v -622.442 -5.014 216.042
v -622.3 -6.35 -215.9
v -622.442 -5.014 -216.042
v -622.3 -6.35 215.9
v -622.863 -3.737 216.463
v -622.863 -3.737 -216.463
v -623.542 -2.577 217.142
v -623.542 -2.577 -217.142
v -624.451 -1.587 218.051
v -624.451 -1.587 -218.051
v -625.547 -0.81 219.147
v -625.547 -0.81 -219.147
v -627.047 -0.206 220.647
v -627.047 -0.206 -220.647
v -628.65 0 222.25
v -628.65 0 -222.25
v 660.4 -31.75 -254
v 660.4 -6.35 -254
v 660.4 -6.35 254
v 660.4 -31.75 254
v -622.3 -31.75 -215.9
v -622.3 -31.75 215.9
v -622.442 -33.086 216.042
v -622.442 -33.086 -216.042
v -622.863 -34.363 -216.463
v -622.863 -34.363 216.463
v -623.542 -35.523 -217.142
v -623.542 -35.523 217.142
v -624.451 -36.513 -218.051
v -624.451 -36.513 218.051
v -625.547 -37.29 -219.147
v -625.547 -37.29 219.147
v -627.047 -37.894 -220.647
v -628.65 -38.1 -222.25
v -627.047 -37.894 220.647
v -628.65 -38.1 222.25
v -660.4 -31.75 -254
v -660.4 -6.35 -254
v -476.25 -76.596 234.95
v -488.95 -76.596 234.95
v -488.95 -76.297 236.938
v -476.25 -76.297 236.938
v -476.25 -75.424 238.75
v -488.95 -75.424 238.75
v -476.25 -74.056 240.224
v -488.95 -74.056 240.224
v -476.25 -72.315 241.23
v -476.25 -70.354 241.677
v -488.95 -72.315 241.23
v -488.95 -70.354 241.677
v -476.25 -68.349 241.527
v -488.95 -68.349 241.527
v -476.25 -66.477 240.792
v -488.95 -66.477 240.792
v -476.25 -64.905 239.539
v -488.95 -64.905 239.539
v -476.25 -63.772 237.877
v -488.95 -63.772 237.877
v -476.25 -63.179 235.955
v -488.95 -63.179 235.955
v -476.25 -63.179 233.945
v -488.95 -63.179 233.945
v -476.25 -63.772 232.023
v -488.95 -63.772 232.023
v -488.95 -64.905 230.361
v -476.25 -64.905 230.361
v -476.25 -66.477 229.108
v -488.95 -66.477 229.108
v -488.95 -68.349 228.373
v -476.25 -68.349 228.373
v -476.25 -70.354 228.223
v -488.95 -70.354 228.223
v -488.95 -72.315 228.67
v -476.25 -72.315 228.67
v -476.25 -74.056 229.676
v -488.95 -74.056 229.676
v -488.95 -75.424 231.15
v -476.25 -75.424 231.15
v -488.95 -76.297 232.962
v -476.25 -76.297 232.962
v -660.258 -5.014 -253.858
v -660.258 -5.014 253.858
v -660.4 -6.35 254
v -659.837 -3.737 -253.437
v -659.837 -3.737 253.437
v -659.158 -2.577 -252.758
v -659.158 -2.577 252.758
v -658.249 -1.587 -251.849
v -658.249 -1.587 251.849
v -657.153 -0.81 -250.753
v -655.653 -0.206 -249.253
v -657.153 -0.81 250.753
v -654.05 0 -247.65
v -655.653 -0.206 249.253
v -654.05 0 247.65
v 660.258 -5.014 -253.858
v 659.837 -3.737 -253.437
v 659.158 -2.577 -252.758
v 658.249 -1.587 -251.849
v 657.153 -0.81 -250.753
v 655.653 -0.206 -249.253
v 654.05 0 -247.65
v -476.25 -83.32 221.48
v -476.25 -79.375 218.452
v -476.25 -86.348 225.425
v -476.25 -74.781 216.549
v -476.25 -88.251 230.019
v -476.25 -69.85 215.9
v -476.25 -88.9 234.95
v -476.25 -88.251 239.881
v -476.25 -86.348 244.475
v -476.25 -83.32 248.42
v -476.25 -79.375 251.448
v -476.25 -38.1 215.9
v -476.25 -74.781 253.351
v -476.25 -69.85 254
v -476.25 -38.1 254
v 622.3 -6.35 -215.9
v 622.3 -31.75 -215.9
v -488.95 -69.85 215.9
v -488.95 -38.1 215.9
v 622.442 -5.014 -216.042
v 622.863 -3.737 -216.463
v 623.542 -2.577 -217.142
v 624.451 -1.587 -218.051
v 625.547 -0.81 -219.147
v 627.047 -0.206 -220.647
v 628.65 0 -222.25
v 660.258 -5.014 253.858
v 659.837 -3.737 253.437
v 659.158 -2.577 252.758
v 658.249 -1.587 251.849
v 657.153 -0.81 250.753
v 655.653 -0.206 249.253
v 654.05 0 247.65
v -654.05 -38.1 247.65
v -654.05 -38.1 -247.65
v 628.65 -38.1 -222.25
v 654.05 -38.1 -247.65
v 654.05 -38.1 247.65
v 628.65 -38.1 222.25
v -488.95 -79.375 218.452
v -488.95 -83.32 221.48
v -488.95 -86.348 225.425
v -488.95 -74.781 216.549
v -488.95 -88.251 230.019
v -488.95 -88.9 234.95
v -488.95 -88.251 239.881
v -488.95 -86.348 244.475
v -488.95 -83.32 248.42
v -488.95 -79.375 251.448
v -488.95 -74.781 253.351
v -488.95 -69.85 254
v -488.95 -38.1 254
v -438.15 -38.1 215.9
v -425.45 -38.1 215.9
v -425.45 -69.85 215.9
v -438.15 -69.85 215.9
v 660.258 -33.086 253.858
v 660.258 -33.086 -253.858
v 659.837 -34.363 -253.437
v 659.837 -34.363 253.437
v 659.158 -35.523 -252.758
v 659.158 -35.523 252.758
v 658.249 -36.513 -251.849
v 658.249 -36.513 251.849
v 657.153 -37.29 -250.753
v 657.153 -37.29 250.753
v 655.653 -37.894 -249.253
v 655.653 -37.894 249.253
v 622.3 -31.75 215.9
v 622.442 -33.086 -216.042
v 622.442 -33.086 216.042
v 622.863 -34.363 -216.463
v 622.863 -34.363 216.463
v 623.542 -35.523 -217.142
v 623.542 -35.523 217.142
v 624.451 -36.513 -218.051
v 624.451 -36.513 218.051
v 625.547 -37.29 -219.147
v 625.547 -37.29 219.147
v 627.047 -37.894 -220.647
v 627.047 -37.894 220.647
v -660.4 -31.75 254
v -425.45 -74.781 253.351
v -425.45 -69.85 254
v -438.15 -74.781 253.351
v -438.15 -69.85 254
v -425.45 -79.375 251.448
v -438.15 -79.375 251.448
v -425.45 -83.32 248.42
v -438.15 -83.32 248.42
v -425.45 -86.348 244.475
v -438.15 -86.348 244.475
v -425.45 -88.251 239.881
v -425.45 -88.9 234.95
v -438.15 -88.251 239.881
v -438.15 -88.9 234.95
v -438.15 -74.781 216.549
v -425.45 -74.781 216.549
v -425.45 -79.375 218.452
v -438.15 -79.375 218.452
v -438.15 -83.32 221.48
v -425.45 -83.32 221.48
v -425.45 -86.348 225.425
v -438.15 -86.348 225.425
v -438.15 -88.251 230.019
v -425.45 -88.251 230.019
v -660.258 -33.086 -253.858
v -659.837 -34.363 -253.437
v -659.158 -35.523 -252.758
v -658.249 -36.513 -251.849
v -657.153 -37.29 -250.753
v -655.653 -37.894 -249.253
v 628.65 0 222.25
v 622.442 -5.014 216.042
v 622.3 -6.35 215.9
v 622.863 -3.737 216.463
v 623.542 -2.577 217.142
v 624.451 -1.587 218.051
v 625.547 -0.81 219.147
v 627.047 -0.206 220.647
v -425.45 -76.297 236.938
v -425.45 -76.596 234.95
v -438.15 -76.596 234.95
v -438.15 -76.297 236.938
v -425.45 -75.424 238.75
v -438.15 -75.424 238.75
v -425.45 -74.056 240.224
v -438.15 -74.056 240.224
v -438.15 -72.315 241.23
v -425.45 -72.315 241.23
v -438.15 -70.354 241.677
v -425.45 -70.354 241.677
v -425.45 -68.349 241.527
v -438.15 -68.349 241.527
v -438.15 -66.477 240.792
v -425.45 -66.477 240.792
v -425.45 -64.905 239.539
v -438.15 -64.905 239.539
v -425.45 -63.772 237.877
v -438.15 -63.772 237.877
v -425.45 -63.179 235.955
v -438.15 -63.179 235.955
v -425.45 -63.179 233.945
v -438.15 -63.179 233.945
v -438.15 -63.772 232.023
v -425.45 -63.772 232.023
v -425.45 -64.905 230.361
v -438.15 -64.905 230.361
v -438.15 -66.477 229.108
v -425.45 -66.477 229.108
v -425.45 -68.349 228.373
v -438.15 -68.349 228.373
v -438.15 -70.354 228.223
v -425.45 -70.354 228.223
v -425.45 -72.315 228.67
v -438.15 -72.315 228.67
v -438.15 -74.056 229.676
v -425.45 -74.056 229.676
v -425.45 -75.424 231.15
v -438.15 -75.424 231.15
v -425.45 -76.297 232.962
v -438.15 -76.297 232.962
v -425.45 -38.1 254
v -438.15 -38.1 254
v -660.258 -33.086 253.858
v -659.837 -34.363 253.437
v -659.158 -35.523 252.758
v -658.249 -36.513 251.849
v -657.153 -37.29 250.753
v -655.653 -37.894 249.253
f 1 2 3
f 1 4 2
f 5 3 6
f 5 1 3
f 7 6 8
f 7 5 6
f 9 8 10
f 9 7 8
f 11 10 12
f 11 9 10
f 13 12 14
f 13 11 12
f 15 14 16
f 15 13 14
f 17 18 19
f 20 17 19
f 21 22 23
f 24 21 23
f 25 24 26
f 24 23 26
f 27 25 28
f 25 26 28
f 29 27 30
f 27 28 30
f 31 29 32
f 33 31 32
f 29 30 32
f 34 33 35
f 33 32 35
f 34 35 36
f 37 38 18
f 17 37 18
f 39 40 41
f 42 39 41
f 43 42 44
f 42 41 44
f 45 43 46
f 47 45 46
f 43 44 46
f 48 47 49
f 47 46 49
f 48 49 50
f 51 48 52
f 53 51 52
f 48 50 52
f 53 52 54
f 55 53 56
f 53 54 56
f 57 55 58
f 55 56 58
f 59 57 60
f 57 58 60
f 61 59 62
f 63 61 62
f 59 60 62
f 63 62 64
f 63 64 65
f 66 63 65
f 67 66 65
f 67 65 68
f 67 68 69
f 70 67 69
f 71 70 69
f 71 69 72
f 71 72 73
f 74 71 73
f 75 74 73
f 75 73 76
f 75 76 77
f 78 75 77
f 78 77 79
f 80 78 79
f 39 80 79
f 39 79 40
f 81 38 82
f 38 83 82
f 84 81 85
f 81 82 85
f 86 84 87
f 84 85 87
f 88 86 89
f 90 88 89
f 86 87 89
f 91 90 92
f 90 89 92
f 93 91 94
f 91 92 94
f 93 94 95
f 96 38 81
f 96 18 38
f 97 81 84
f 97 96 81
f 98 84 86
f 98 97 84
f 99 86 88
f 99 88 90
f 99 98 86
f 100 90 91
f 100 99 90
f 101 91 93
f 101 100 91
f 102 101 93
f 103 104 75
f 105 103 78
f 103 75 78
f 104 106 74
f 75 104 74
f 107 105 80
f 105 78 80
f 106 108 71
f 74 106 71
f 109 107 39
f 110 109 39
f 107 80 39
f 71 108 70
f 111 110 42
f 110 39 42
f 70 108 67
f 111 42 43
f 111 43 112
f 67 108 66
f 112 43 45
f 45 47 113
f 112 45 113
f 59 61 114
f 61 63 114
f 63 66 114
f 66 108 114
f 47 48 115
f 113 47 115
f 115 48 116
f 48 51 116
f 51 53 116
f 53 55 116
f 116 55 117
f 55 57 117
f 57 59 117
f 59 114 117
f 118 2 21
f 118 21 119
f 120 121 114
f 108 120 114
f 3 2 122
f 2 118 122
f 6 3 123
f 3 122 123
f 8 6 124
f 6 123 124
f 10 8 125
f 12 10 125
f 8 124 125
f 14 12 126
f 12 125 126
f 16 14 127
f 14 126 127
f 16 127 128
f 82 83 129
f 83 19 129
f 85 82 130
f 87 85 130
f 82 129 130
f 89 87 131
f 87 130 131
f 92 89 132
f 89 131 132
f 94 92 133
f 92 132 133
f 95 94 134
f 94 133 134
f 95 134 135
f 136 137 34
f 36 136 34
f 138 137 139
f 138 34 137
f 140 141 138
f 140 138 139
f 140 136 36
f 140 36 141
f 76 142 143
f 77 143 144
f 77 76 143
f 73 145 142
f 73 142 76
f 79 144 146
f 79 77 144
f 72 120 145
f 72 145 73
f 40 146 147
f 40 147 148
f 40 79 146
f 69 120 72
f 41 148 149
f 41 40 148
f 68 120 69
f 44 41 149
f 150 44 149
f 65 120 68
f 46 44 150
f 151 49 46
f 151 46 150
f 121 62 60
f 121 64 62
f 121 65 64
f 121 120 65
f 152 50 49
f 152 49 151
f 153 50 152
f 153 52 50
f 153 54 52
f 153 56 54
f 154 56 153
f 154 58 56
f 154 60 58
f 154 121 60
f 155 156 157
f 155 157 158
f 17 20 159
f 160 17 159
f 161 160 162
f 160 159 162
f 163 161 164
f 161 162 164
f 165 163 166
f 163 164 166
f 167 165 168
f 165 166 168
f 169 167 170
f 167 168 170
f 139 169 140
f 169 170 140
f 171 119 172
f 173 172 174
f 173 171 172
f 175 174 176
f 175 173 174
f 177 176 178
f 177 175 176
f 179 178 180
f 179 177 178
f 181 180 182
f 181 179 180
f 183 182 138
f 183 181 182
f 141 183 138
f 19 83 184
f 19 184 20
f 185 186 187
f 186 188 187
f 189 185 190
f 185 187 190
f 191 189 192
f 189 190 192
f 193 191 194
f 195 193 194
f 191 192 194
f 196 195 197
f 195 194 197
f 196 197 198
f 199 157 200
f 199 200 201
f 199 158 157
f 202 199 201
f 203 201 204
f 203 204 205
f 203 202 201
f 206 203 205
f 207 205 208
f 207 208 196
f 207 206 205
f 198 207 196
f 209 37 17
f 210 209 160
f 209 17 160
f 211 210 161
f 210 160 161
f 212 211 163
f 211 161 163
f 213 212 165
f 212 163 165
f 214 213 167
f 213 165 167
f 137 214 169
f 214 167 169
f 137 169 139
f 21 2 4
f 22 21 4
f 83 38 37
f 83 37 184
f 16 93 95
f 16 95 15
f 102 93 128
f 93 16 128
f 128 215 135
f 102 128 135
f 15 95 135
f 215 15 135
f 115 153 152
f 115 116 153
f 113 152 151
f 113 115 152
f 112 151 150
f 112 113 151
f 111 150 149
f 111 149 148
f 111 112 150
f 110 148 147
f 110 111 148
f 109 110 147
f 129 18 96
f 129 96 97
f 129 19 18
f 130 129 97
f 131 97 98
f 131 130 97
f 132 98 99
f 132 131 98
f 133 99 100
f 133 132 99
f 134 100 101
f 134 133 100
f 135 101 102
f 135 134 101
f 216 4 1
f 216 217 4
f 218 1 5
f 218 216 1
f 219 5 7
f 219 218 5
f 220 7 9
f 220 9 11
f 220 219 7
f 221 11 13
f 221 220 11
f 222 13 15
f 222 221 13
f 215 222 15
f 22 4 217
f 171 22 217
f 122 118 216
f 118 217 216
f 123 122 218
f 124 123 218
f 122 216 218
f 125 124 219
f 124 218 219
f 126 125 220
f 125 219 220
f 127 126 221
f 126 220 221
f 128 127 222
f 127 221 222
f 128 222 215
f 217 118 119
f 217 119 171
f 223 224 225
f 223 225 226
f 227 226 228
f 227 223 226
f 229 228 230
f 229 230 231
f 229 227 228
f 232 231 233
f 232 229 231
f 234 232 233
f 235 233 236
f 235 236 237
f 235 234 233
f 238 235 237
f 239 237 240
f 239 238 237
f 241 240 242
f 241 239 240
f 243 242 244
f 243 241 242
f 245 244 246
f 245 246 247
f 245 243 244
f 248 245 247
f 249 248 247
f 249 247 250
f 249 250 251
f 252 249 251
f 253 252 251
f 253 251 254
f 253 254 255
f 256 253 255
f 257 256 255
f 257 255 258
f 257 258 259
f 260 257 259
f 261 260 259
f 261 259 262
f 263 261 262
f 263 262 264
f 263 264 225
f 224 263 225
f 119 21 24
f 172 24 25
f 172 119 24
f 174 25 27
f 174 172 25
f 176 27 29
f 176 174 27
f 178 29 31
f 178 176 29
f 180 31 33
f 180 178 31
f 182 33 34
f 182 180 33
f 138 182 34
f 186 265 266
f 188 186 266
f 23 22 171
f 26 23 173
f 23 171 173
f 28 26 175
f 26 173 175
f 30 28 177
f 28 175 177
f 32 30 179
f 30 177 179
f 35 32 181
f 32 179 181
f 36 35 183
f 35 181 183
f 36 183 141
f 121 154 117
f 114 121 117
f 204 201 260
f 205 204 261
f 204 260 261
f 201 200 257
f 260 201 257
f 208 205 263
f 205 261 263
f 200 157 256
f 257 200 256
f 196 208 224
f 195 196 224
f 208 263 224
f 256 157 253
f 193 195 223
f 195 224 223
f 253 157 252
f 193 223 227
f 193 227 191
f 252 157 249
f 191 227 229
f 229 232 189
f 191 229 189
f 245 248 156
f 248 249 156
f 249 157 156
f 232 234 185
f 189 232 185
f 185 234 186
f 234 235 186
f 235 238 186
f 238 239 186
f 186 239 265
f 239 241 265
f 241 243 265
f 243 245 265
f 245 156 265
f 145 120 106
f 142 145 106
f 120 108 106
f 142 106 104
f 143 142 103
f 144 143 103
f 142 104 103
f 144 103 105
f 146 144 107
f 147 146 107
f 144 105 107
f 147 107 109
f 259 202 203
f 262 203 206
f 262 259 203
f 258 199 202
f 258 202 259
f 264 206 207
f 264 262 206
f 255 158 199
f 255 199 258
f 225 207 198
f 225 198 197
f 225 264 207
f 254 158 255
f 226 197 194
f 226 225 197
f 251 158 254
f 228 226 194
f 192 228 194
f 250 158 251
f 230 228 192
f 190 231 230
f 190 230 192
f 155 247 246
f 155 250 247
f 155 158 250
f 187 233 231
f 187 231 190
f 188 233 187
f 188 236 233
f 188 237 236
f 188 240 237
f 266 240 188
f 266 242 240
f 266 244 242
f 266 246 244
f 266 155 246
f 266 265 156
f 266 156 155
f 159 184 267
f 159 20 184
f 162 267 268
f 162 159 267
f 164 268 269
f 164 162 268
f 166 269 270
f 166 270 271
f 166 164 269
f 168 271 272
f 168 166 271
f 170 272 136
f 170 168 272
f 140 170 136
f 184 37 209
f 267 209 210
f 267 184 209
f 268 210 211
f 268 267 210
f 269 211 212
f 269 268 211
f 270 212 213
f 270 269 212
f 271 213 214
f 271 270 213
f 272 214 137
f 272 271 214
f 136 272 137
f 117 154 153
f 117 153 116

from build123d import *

# Parameters (mm, degrees)
F0_W     = 1320.8
F0_H     = 508
F0_W_2   = 1244.6
F0_H_2   = 431.8
F1_DEPTH = 38.1
F2_R     = 6.35
F3_W     = 12.7
F3_H     = 38.1
F4_DEPTH = 50.8
F5_R     = 19.04999
F7_D     = 13.49248


# Not quite as in the source:
# - a fillet or chamfer is up to 0.001 mm smaller than in the source, because OpenCascade refuses the exact size


with BuildPart() as f1:
    # F0 (on Front) → F1 (new body)
    with BuildSketch(Plane.XZ):
        Rectangle(F0_W, F0_H)
        Rectangle(F0_W_2, F0_H_2, mode=Mode.SUBTRACT)
    extrude(amount=F1_DEPTH)

    # F2
    f2_edges = [f1.edges().sort_by_distance(p)[0] for p in [
        (0, -38.1, 254),
        (-660.4, -38.1, 0),
        (0, -38.1, -254),
        (660.4, -38.1, 0),
        (-622.3, -38.1, 0),
        (0, -38.1, 215.9),
        (622.3, -38.1, 0),
        (0, -38.1, -215.9),
        (0, 0, 254),
        (-660.4, 0, 0),
        (0, 0, -254),
        (660.4, 0, 0),
        (-622.3, 0, 0),
        (0, 0, 215.9),
        (622.3, 0, 0),
        (0, 0, -215.9),
    ]]
    fillet(f2_edges, radius=F2_R)


with BuildPart() as f4:
    # F3 (on face) → F4 (new body)
    with BuildSketch(Plane.XZ.offset(38.1)):
        with Locations((-482.6, 234.95)):
            Rectangle(F3_W, F3_H)
    extrude(amount=F4_DEPTH)

    # F5 (radius 19.05 in the source; OpenCascade refuses exactly that, so slightly less here)
    f5_edges = [f4.edges().sort_by_distance(p)[0] for p in [
        (-482.6, -88.9, 254),
        (-482.6, -88.9, 215.9),
    ]]
    fillet(f5_edges, radius=F5_R)

    # F7 (through all)
    with Locations(Plane.YZ.offset(-476.25)):
        with Locations((-69.85, 234.95)):
            Hole(F7_D / 2)


with BuildPart() as f9_1:
    # F9: instance of F4
    add(f4.part.mirror(Plane(origin=(-457.2, -60.9330603651, 234.95), x_dir=(0, 1, 0), z_dir=(1, 0, 0))))


solid = Compound([f1.part, f4.part, f9_1.part])
